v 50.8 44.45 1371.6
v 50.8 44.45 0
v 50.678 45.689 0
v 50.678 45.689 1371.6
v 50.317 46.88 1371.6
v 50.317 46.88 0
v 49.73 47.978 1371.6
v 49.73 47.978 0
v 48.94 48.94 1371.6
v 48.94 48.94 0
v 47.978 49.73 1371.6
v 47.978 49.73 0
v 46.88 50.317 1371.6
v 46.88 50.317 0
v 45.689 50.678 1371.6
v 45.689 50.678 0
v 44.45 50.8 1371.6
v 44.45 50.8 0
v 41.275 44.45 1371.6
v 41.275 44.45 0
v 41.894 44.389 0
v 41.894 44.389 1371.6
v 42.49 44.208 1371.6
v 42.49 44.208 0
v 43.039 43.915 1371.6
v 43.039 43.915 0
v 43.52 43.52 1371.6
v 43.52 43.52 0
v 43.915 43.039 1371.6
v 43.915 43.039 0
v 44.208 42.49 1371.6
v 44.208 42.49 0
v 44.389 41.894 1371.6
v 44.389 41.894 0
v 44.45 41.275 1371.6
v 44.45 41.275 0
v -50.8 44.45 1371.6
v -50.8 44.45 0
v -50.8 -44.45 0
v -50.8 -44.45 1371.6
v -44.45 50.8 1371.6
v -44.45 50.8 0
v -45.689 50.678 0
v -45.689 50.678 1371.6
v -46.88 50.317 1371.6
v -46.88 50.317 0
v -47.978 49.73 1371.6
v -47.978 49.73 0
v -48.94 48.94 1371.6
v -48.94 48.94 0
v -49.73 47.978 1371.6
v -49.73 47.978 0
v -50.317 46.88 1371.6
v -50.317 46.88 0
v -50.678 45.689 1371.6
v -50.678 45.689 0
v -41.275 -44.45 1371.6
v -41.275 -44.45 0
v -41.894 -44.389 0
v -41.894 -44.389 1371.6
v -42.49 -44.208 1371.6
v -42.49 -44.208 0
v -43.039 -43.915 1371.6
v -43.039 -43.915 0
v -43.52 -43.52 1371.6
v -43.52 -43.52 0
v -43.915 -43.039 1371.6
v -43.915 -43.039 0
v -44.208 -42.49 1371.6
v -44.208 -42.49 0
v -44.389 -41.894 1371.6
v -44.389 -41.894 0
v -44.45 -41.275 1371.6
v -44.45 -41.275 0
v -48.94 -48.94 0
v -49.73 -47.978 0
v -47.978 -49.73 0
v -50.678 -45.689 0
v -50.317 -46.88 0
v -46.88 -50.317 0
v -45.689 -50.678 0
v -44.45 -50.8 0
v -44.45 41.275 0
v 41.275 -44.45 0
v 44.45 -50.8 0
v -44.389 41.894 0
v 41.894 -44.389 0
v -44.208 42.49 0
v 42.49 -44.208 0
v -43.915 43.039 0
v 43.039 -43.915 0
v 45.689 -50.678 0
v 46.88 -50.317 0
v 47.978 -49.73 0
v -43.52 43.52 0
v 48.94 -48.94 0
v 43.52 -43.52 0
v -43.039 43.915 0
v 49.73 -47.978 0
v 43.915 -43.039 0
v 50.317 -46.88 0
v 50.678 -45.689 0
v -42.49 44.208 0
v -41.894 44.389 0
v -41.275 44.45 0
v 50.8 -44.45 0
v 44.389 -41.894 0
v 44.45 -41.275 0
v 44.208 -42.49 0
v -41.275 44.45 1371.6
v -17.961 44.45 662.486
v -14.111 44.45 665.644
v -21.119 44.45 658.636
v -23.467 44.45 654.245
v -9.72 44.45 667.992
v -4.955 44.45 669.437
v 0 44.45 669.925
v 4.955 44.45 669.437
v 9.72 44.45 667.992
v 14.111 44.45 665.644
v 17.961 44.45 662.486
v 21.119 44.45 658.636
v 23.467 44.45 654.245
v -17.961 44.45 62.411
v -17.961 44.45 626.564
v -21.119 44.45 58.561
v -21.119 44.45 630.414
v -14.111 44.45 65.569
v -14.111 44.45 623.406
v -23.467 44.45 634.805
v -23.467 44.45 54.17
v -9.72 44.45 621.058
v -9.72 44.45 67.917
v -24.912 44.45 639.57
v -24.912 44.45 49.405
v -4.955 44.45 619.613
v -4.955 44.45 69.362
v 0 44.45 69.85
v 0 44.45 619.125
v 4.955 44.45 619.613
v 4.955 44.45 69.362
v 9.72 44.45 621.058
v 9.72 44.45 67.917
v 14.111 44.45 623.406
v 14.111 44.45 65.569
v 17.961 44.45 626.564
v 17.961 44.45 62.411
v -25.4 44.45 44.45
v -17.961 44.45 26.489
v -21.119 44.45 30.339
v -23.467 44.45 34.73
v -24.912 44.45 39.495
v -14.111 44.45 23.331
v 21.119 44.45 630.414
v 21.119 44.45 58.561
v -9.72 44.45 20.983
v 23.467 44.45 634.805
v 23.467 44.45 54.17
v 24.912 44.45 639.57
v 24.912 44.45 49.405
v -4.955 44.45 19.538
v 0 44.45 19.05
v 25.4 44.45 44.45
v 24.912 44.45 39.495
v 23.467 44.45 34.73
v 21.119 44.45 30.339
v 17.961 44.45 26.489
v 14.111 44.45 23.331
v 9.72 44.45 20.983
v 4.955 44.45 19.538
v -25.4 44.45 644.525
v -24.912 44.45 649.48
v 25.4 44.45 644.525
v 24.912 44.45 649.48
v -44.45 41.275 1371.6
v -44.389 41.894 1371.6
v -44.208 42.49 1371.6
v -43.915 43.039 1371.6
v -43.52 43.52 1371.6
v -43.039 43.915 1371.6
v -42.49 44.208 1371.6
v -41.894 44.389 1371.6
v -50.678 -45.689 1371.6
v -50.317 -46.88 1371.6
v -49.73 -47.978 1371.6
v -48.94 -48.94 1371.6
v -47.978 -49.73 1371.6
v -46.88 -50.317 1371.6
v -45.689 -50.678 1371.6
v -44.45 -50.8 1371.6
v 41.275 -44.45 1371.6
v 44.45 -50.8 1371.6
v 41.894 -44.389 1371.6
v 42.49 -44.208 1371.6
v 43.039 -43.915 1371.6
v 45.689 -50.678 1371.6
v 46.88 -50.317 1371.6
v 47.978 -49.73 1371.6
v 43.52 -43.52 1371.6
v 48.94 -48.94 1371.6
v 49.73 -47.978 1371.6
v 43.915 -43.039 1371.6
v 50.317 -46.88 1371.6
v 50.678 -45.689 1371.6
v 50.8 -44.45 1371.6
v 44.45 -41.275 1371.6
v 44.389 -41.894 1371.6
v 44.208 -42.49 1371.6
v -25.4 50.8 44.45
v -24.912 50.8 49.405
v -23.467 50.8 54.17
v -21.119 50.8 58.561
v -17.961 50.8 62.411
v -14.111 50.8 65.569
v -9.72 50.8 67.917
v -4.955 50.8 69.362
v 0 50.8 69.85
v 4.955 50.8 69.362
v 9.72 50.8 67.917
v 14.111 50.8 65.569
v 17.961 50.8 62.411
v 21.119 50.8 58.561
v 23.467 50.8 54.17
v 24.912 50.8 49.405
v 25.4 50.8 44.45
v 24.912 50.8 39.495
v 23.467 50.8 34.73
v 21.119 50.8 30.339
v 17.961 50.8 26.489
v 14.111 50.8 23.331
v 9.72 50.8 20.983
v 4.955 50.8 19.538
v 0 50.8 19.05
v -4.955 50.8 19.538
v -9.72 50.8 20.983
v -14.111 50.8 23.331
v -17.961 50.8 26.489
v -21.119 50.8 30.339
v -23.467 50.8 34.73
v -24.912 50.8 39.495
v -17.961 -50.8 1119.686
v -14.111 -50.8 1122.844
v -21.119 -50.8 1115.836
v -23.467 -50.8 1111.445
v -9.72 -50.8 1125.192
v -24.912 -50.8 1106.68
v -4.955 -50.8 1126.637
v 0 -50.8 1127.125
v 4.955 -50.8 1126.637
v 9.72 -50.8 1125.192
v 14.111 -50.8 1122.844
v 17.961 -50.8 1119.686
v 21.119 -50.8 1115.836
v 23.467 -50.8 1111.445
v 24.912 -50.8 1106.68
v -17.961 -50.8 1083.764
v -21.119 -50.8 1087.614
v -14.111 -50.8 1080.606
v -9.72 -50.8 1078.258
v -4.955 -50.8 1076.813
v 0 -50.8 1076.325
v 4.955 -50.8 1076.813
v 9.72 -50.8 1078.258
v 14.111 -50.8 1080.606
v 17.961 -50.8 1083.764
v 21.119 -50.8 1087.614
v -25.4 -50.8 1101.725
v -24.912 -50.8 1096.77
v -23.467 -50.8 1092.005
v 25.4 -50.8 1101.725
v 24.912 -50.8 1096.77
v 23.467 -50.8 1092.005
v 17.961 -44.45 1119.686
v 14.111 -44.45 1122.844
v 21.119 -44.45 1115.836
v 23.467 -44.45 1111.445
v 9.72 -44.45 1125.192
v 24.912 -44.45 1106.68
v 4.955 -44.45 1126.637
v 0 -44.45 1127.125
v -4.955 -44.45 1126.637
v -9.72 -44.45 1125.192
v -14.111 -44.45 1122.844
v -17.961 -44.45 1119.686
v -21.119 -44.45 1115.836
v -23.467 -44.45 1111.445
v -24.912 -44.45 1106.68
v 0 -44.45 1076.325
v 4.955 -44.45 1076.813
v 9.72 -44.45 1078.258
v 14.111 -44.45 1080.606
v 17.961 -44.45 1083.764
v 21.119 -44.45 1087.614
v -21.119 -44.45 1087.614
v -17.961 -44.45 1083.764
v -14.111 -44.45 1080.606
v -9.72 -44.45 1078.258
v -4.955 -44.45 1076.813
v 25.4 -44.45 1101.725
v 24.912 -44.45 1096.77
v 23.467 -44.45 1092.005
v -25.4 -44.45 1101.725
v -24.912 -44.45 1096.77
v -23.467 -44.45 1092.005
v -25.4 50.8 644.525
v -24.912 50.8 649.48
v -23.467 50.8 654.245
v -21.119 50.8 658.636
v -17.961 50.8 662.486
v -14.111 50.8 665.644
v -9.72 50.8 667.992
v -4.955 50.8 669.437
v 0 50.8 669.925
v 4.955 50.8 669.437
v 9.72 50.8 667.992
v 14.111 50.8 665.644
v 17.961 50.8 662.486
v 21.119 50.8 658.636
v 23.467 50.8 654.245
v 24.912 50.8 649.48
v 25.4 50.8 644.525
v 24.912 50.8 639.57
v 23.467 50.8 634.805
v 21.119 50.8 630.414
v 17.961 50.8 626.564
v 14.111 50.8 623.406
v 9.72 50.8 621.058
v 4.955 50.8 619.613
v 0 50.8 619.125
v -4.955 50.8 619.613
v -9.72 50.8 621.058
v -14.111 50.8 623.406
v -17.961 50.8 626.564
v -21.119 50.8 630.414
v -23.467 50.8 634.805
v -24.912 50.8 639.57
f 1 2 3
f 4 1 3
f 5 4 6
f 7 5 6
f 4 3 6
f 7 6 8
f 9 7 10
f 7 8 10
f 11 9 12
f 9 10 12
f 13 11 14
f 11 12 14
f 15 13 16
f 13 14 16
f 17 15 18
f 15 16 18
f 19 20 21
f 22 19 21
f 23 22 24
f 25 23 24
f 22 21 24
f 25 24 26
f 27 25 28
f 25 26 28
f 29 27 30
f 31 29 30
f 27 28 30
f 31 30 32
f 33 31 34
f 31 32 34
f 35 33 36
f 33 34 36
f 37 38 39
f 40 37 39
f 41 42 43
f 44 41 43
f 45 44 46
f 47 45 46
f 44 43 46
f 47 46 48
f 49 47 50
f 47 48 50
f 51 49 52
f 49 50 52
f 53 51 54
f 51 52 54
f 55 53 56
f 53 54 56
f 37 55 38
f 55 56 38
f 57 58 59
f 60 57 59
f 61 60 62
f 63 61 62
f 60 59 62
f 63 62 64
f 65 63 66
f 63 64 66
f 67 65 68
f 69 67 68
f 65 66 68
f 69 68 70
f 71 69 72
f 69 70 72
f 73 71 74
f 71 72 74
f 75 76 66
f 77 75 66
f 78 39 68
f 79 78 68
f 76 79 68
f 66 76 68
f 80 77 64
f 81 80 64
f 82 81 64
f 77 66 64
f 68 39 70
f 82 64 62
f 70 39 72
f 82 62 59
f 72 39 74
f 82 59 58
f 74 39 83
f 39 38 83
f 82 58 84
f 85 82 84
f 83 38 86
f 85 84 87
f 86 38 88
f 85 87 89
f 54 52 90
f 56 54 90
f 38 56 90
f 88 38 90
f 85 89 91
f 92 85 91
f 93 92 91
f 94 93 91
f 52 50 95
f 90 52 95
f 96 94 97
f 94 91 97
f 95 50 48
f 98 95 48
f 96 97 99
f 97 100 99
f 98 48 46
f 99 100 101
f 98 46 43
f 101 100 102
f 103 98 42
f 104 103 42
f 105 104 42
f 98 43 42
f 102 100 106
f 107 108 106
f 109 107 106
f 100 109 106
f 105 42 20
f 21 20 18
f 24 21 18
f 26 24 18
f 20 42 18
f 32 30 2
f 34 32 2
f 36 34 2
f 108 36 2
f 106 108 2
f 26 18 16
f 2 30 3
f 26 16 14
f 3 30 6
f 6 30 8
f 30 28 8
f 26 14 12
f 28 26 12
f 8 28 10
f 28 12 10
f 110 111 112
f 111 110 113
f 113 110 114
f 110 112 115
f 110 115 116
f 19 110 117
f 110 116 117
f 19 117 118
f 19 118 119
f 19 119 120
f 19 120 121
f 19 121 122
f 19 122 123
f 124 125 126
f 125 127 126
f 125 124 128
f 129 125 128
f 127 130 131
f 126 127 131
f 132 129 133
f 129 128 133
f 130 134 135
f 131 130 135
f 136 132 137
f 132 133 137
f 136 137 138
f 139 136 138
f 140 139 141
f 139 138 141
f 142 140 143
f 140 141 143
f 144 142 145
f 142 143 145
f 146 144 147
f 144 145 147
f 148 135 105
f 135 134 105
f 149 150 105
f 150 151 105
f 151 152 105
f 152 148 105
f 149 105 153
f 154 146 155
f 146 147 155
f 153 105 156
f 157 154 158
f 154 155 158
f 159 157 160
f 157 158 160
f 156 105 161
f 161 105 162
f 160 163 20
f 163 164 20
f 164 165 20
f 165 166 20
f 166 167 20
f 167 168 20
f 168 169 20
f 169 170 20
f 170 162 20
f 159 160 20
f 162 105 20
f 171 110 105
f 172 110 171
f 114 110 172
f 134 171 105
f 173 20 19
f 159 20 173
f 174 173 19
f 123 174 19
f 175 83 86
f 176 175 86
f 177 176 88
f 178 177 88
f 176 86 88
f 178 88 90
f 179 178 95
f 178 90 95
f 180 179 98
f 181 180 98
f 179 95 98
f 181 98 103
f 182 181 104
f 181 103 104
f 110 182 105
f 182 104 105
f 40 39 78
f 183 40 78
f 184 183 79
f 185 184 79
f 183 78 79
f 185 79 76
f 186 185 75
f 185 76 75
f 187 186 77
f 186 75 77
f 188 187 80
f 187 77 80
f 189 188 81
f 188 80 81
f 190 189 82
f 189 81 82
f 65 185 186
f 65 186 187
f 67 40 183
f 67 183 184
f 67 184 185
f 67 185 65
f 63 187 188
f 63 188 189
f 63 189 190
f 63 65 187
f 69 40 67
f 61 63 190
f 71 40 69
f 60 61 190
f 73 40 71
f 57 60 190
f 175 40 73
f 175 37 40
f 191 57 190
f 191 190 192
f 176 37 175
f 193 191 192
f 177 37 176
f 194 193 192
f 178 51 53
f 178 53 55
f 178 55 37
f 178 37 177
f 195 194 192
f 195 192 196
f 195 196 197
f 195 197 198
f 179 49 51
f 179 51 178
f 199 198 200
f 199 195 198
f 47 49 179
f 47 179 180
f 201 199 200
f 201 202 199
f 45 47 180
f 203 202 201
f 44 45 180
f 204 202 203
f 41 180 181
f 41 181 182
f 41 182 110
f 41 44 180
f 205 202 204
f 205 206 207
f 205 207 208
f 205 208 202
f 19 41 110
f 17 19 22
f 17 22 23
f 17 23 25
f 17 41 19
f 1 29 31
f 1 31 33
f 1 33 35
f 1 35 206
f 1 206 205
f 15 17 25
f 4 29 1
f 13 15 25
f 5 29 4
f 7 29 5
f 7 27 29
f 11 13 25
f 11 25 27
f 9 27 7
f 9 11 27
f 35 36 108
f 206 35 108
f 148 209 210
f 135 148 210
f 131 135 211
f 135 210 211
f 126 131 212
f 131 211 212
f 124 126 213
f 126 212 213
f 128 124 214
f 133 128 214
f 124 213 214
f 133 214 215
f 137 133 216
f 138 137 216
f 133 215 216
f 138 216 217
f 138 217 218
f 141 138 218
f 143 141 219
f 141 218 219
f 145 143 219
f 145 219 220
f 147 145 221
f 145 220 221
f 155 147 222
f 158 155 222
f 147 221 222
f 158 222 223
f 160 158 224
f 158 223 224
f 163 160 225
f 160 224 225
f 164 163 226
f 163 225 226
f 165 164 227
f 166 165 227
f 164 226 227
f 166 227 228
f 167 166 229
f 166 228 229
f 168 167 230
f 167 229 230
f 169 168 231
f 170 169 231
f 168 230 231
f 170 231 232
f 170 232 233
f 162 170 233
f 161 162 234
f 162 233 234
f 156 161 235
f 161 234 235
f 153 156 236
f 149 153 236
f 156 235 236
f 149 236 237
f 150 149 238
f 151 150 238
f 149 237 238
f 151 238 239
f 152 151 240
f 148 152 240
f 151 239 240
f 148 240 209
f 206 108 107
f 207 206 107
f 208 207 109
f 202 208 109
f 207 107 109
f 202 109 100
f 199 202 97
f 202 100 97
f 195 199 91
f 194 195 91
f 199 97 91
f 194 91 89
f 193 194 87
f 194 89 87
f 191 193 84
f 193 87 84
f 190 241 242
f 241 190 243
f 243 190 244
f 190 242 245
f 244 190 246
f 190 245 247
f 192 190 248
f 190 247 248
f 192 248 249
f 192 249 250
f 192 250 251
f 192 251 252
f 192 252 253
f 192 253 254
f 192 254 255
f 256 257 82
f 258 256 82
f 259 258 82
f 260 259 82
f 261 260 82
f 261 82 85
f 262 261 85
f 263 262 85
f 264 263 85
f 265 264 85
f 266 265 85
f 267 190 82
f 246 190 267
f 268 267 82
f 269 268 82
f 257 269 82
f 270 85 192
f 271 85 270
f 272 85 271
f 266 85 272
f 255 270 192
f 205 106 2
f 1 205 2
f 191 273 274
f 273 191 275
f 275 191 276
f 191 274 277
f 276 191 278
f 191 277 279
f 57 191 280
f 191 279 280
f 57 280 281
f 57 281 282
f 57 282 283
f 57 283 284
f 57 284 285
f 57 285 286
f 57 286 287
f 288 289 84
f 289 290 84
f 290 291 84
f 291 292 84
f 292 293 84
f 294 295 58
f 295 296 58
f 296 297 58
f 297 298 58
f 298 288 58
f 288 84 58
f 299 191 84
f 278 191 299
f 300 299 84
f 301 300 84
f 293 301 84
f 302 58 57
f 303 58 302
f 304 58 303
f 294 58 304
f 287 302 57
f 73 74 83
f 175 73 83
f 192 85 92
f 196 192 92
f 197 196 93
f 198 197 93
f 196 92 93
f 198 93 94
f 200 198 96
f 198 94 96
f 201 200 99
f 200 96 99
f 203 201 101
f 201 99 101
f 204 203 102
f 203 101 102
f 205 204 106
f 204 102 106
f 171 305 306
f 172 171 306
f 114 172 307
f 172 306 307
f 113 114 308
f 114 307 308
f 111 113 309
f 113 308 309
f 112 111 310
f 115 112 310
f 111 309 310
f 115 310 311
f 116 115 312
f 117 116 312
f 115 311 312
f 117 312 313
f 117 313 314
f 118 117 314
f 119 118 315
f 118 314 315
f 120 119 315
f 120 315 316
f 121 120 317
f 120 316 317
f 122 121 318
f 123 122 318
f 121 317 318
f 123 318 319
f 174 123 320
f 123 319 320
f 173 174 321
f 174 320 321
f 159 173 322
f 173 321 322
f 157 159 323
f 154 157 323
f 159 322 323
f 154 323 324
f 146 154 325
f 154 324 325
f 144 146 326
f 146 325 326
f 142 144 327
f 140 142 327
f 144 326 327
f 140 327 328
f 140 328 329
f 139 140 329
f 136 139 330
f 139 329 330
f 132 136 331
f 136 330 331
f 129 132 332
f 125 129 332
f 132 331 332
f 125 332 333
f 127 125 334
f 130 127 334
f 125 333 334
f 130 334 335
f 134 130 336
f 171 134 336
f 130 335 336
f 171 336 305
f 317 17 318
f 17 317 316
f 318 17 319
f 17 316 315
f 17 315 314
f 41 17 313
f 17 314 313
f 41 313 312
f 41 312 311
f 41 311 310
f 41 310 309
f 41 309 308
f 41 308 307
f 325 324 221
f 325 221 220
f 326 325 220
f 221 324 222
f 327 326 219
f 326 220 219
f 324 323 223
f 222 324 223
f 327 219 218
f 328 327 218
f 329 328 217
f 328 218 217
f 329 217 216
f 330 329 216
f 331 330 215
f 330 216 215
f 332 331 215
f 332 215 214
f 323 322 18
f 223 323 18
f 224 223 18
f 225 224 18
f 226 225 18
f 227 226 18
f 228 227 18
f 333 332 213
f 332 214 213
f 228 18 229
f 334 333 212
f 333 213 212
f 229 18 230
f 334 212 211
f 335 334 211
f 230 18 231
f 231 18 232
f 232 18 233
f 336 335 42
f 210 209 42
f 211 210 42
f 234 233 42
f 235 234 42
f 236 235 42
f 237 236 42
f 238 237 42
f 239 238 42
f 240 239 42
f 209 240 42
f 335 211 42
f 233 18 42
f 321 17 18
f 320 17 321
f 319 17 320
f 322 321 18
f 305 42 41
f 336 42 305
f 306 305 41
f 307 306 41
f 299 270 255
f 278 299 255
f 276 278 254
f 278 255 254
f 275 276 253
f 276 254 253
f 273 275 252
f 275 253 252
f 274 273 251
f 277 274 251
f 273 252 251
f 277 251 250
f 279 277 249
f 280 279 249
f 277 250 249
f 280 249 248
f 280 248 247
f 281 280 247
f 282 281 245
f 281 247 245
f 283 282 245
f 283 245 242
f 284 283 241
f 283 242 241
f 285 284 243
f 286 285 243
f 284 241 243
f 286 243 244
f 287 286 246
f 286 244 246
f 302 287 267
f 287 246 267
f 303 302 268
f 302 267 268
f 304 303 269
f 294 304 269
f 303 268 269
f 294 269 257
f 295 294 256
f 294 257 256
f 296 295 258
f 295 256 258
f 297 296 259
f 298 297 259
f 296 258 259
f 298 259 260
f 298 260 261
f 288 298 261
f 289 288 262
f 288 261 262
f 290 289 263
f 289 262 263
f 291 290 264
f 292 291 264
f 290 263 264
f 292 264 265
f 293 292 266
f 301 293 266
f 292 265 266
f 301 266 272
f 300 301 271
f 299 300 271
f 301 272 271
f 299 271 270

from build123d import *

# Parameters (mm, degrees)
F1_DEPTH = 1371.6
F2_R     = 25.4
F3_DEPTH = 6.35
F4_R     = 25.4
F5_DEPTH = 6.35


with BuildPart() as f1:
    # F0 (on Top) → F1 (new body)
    with BuildSketch(Plane.XY):
        with BuildLine():
            Line((44.45, 50.8), (-44.45, 50.8))
            ThreePointArc((-44.45, 50.8), (-48.940128, 48.940128), (-50.8, 44.45))
            Line((-50.8, 44.45), (-50.8, -44.45))
            ThreePointArc((-50.8, -44.45), (-48.940128, -48.940128), (-44.45, -50.8))
            Line((-44.45, -50.8), (44.45, -50.8))
            ThreePointArc((44.45, -50.8), (48.940128, -48.940128), (50.8, -44.45))
            Line((50.8, -44.45), (50.8, 44.45))
            ThreePointArc((50.8, 44.45), (48.940128, 48.940128), (44.45, 50.8))
        make_face()
        with BuildLine():
            ThreePointArc((-44.45, 41.275), (-43.520064, 43.520064), (-41.275, 44.45))
            Line((-41.275, 44.45), (41.275, 44.45))
            ThreePointArc((41.275, 44.45), (43.520064, 43.520064), (44.45, 41.275))
            Line((44.45, 41.275), (44.45, -41.275))
            ThreePointArc((44.45, -41.275), (43.520064, -43.520064), (41.275, -44.45))
            Line((41.275, -44.45), (-41.275, -44.45))
            ThreePointArc((-41.275, -44.45), (-43.520064, -43.520064), (-44.45, -41.275))
            Line((-44.45, -41.275), (-44.45, 41.275))
        make_face(mode=Mode.SUBTRACT)
    extrude(amount=F1_DEPTH)

    # F2 (on face) → F3 (cut, through all)
    with BuildSketch(Plane(origin=(0, 50.8, 0), x_dir=(-1, 0, 0), z_dir=(0, 1, 0))):
        with Locations((0, 644.525)):
            Circle(F2_R)
        with Locations((0, 44.45)):
            Circle(F2_R)
    extrude(amount=-F3_DEPTH, mode=Mode.SUBTRACT)

    # F4 (on face) → F5 (cut, through all)
    with BuildSketch(Plane.XZ.offset(50.8)):
        with Locations((0, 1101.725)):
            Circle(F4_R)
    extrude(amount=-F5_DEPTH, mode=Mode.SUBTRACT)


solid = f1.part
